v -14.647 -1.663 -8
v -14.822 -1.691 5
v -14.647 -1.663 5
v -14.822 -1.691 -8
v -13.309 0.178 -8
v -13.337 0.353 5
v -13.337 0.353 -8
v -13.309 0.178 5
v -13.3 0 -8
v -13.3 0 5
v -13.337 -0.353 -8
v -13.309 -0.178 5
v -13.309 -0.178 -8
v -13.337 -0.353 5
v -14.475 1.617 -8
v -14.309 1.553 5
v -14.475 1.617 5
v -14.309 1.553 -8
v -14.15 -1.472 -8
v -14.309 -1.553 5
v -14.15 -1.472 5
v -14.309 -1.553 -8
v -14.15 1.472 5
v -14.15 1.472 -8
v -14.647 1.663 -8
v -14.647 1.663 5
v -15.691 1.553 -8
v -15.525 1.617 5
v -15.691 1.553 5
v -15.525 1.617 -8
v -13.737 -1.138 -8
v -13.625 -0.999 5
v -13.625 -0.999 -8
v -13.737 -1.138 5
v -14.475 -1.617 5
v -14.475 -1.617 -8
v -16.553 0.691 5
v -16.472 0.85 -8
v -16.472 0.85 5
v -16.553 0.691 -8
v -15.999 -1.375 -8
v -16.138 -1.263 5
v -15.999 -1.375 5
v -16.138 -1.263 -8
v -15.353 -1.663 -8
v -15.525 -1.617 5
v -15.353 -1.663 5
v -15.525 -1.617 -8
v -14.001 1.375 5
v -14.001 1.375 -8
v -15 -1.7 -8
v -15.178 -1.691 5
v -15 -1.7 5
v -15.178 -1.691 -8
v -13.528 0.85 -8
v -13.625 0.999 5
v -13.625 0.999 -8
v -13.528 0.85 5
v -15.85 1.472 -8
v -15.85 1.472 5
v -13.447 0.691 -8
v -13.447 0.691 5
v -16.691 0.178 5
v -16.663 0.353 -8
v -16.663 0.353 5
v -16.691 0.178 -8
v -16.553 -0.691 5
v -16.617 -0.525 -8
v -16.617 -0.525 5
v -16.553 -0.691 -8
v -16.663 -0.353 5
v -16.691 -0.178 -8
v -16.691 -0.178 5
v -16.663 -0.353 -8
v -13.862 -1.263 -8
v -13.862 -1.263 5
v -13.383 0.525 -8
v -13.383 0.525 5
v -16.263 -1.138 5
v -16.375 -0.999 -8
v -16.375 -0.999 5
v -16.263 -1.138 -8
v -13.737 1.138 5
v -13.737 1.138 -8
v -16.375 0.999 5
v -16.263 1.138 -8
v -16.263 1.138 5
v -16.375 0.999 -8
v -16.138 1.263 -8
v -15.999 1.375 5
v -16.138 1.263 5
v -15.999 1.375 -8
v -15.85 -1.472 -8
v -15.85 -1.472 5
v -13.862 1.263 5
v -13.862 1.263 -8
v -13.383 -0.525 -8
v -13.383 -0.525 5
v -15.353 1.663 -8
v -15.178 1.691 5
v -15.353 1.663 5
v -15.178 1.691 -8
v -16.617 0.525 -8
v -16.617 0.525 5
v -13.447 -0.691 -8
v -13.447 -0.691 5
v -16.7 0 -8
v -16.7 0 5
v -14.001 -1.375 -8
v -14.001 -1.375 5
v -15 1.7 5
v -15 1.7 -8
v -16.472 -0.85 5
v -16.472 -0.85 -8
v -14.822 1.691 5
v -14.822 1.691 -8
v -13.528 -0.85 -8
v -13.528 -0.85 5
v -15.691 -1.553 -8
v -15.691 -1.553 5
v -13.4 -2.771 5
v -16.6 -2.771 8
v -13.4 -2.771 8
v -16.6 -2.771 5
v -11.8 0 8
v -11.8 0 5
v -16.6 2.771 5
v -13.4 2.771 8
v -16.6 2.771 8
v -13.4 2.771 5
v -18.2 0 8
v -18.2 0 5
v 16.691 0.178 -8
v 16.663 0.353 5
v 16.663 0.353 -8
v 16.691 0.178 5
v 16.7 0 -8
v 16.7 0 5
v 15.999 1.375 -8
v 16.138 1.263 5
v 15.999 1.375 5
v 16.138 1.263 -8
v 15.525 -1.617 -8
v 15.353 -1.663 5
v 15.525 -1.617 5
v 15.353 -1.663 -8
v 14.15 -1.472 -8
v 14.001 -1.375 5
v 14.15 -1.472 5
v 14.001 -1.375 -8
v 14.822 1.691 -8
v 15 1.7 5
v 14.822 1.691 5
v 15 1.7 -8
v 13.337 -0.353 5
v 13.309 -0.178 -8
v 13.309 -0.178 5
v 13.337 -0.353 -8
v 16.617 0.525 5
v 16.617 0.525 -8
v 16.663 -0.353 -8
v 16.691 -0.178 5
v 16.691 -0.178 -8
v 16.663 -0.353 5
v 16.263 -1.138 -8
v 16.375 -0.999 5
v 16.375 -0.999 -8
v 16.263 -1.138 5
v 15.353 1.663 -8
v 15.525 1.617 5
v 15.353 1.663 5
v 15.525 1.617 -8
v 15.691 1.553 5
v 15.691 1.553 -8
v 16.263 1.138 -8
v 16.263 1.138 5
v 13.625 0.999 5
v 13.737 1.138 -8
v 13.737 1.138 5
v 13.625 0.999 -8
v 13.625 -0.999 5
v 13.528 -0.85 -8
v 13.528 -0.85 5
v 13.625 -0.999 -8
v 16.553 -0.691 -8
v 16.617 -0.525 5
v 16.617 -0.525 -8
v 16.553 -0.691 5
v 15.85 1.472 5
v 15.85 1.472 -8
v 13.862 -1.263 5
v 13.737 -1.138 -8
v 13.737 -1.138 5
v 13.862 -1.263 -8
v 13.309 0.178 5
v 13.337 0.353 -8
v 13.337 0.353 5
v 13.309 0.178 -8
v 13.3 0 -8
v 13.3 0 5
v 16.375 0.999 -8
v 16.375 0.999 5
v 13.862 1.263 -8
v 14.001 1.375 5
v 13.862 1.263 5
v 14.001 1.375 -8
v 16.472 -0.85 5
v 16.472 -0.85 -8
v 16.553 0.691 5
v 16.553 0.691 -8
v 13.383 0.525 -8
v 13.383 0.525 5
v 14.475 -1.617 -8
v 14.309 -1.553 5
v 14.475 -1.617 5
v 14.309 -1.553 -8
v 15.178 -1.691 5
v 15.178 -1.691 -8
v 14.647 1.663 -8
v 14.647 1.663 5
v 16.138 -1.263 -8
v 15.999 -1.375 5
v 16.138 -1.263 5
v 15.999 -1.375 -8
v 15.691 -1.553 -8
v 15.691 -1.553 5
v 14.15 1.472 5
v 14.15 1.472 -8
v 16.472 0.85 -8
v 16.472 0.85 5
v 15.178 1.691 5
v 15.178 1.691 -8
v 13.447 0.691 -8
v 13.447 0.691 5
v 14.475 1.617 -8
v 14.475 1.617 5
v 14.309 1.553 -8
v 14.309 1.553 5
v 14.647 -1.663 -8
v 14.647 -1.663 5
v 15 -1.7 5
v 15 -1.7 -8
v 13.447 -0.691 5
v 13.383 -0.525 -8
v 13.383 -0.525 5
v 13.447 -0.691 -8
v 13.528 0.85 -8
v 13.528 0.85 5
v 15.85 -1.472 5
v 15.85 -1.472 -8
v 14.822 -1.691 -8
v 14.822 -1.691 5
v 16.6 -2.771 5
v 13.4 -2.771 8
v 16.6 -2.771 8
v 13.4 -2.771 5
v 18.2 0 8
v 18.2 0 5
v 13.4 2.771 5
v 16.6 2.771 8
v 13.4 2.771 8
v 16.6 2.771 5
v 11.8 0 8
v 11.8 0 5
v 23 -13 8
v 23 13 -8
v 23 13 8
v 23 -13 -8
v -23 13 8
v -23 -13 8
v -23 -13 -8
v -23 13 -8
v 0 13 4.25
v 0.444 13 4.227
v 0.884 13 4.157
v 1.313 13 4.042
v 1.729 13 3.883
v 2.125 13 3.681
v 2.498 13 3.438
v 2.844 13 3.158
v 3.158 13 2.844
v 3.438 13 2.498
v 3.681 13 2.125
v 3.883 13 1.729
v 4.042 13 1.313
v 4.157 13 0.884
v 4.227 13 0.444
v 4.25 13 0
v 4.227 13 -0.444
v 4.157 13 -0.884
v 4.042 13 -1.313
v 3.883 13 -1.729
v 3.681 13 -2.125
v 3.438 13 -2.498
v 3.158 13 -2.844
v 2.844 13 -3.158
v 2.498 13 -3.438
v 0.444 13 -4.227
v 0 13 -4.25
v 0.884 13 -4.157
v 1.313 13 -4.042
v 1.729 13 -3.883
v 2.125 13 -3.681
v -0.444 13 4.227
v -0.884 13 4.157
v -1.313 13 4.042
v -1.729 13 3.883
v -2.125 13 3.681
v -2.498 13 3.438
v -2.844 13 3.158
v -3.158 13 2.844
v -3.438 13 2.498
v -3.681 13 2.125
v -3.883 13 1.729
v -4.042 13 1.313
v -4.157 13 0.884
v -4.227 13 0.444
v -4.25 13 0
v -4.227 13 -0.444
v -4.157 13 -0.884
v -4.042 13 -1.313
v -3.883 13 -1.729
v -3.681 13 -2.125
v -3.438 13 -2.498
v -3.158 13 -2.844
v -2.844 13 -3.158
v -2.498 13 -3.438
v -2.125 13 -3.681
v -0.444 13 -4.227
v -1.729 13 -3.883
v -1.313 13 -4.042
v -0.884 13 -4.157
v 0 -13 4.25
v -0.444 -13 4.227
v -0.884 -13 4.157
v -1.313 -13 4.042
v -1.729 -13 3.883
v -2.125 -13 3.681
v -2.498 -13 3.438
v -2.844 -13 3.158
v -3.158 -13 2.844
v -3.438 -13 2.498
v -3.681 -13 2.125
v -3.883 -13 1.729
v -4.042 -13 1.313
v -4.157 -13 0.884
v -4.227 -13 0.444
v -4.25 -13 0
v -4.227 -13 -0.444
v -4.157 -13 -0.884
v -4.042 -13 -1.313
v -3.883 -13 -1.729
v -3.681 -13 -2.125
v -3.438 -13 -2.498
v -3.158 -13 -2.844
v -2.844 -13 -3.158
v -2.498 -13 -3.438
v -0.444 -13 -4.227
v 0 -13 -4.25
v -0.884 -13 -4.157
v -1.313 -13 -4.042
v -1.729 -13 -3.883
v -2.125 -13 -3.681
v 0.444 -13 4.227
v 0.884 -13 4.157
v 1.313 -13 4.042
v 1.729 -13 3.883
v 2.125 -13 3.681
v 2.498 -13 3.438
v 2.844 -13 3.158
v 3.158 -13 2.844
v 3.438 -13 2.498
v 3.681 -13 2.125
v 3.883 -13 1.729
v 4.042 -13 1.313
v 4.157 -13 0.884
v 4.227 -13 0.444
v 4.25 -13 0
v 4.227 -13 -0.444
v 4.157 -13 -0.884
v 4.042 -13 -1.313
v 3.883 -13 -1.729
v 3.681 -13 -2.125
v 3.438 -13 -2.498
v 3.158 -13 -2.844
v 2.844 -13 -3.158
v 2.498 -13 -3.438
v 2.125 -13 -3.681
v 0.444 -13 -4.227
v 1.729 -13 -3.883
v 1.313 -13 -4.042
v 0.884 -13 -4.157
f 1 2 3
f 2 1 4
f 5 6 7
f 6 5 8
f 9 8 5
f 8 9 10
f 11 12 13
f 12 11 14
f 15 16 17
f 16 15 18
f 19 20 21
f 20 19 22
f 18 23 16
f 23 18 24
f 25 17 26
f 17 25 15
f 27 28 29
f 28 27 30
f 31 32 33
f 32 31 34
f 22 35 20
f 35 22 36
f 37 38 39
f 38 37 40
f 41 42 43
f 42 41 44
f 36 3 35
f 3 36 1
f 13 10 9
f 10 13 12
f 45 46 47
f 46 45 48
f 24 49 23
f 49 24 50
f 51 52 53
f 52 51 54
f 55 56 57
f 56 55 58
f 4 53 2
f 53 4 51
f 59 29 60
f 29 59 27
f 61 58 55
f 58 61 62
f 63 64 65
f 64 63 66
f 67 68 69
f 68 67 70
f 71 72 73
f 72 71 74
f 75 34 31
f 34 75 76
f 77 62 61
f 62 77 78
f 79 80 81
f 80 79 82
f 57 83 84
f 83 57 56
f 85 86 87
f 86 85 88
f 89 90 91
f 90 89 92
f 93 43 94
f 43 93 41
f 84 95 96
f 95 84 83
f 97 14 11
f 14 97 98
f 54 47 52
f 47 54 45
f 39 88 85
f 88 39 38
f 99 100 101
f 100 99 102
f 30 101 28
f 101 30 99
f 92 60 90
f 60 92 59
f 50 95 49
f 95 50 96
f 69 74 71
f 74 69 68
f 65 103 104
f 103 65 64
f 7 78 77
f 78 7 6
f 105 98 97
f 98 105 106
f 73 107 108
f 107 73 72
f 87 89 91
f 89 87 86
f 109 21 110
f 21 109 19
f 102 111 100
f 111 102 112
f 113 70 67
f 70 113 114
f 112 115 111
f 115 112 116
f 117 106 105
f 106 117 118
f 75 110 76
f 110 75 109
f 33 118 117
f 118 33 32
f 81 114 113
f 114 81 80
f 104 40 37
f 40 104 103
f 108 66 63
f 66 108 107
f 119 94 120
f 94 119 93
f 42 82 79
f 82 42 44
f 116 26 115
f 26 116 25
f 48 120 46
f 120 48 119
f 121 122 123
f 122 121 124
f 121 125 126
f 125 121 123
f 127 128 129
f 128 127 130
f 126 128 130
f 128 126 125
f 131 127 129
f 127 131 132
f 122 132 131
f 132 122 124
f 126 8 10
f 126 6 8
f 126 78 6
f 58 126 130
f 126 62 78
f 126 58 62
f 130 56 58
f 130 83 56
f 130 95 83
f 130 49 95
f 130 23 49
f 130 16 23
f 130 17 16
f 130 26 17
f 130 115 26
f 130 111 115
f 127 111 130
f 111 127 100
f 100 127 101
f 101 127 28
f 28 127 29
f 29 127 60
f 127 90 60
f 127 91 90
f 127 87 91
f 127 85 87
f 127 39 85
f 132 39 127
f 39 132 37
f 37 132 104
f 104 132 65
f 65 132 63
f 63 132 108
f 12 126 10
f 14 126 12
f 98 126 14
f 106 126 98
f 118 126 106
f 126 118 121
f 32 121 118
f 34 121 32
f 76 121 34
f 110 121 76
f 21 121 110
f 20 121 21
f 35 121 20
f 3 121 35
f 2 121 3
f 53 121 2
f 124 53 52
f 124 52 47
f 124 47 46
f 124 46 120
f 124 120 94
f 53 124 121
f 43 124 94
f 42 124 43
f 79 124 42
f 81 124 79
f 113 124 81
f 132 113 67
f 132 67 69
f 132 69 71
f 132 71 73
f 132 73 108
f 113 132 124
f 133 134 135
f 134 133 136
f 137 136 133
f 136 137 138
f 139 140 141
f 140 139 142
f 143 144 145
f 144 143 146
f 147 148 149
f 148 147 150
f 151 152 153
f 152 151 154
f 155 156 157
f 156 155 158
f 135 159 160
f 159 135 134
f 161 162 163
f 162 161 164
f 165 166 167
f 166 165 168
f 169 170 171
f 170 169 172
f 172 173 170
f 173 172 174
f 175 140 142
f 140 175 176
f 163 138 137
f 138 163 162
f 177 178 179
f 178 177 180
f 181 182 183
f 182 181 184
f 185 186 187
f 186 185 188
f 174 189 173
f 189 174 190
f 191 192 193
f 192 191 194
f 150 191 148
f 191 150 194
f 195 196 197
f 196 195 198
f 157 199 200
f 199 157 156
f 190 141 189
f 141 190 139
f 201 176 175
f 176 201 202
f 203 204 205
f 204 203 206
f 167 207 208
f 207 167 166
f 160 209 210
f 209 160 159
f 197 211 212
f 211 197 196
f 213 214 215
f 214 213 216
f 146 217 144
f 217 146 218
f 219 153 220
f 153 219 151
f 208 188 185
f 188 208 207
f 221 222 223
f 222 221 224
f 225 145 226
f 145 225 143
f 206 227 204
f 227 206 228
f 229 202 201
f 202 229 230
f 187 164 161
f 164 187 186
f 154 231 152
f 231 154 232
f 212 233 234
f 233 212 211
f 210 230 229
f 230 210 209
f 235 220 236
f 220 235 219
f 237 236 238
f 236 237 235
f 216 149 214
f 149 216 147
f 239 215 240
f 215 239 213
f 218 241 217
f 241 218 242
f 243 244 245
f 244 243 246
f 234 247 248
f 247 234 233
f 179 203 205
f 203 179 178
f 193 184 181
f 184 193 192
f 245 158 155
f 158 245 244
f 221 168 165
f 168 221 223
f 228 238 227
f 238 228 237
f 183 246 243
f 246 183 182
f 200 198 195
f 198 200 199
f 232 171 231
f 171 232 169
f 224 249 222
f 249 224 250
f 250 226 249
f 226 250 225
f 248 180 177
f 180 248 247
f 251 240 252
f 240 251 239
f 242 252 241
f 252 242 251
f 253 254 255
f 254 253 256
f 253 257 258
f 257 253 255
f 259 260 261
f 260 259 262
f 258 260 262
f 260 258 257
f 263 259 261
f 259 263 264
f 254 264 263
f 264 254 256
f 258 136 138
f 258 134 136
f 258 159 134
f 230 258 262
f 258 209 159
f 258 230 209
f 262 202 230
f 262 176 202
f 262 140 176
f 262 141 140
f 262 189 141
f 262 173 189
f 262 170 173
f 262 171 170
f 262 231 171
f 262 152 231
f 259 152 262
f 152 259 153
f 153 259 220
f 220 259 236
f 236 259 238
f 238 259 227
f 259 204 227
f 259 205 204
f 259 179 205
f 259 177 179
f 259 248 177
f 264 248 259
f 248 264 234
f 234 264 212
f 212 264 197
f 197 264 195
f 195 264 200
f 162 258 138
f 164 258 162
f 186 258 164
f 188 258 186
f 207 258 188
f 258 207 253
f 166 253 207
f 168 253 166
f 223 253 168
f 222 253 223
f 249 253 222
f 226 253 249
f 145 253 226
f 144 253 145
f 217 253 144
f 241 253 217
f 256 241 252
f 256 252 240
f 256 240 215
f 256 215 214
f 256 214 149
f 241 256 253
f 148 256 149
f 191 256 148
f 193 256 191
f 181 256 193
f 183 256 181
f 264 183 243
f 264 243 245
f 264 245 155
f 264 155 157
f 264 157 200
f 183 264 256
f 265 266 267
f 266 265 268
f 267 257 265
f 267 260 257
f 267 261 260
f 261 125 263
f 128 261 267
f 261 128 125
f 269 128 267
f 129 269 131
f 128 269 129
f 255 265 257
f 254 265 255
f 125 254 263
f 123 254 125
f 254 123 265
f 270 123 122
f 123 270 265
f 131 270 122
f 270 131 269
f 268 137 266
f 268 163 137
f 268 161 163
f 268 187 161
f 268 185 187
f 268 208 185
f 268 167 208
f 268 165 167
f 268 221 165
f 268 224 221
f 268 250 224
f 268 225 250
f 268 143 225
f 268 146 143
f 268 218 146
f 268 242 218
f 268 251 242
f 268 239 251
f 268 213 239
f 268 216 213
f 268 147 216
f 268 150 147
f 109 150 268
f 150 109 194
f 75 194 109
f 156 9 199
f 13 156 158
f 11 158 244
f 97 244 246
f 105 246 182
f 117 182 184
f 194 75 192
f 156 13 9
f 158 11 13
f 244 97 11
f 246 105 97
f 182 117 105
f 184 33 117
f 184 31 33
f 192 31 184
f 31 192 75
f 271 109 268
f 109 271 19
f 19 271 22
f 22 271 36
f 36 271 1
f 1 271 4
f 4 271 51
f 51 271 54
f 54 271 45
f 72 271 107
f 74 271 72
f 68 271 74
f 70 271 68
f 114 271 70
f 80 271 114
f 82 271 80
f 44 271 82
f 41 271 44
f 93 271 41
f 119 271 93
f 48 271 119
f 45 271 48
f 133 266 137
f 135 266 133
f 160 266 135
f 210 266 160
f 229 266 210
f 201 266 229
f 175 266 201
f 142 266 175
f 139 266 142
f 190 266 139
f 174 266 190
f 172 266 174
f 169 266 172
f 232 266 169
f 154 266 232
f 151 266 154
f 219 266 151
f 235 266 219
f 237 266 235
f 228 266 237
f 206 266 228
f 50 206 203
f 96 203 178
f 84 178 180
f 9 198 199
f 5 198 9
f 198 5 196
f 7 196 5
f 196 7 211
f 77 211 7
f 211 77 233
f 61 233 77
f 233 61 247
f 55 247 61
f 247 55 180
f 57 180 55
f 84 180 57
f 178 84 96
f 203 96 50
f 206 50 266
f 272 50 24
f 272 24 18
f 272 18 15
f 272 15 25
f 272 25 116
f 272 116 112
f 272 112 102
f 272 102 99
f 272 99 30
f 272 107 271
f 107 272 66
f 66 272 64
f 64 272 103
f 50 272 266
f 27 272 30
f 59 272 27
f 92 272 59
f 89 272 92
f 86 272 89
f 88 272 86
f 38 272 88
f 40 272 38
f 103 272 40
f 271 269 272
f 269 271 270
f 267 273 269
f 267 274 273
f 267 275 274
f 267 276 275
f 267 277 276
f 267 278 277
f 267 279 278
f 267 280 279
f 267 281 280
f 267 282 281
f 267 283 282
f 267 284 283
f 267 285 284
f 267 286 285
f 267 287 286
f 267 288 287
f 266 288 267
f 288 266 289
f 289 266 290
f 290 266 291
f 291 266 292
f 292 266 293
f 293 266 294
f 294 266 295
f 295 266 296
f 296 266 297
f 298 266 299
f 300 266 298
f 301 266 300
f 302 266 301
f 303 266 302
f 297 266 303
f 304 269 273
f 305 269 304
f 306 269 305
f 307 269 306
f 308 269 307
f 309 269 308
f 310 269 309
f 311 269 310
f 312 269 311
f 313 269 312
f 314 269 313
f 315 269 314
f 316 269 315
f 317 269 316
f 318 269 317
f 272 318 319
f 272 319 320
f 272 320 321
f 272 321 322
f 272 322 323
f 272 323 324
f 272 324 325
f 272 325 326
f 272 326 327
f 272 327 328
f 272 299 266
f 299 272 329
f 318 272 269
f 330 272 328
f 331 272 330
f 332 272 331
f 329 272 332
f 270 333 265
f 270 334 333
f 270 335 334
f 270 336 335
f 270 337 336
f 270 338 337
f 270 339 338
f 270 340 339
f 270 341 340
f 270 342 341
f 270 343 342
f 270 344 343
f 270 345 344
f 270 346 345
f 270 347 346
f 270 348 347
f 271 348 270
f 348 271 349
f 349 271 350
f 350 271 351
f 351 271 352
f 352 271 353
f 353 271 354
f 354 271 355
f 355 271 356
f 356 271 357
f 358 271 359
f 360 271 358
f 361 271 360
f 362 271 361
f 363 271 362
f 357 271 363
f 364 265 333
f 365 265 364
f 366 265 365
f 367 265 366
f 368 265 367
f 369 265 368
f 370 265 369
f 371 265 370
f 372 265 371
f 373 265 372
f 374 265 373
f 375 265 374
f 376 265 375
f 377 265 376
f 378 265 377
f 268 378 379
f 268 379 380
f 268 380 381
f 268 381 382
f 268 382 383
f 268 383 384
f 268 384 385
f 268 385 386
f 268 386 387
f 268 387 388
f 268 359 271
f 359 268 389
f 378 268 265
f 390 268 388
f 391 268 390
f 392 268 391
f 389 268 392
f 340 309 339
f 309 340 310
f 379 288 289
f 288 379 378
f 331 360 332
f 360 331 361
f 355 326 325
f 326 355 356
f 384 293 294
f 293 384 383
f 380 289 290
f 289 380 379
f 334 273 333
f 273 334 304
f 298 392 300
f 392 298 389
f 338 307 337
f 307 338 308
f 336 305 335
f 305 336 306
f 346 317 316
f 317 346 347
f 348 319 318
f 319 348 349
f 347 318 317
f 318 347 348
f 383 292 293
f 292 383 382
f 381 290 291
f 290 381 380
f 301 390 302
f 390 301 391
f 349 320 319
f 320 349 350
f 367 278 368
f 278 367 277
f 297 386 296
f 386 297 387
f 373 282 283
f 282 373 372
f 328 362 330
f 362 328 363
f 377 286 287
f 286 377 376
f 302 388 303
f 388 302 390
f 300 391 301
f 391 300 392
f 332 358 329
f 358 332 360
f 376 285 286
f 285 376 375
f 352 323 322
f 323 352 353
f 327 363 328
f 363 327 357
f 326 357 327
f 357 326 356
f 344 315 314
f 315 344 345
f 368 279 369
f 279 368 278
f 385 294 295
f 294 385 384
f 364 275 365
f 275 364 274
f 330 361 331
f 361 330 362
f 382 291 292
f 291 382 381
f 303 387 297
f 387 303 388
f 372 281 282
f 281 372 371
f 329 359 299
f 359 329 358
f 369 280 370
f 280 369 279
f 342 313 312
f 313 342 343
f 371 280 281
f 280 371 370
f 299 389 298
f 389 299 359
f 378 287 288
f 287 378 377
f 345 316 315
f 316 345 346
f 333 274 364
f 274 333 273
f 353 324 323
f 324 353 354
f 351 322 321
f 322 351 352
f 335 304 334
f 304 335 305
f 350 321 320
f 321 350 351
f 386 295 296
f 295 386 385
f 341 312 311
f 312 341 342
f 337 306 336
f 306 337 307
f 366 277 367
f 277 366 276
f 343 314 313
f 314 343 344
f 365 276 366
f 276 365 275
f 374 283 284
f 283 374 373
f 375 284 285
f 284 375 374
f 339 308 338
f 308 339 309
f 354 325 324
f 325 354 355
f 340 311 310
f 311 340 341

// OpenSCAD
// Cable strain-relief clamp for 8 mm bundle.
$fn = 60;
eps = 0.02;
body_l = 46;
body_w = 26;
body_h = 16;
cable_d = 8.5;
bolt_pitch = 30;
difference() {
    cube([body_l, body_w, body_h], center = true);
    translate([0, -body_w / 2 - eps, 0]) rotate([-90, 0, 0]) cylinder(d = cable_d, h = body_w + 2 * eps);
    for (x = [-bolt_pitch / 2, bolt_pitch / 2]) {
        translate([x, 0, -body_h / 2 - eps]) cylinder(d = 3.4, h = body_h + 2 * eps);
        translate([x, 0, body_h / 2 - 3]) cylinder(d = 6.4, h = 3 + eps, $fn = 6);
    }
}
